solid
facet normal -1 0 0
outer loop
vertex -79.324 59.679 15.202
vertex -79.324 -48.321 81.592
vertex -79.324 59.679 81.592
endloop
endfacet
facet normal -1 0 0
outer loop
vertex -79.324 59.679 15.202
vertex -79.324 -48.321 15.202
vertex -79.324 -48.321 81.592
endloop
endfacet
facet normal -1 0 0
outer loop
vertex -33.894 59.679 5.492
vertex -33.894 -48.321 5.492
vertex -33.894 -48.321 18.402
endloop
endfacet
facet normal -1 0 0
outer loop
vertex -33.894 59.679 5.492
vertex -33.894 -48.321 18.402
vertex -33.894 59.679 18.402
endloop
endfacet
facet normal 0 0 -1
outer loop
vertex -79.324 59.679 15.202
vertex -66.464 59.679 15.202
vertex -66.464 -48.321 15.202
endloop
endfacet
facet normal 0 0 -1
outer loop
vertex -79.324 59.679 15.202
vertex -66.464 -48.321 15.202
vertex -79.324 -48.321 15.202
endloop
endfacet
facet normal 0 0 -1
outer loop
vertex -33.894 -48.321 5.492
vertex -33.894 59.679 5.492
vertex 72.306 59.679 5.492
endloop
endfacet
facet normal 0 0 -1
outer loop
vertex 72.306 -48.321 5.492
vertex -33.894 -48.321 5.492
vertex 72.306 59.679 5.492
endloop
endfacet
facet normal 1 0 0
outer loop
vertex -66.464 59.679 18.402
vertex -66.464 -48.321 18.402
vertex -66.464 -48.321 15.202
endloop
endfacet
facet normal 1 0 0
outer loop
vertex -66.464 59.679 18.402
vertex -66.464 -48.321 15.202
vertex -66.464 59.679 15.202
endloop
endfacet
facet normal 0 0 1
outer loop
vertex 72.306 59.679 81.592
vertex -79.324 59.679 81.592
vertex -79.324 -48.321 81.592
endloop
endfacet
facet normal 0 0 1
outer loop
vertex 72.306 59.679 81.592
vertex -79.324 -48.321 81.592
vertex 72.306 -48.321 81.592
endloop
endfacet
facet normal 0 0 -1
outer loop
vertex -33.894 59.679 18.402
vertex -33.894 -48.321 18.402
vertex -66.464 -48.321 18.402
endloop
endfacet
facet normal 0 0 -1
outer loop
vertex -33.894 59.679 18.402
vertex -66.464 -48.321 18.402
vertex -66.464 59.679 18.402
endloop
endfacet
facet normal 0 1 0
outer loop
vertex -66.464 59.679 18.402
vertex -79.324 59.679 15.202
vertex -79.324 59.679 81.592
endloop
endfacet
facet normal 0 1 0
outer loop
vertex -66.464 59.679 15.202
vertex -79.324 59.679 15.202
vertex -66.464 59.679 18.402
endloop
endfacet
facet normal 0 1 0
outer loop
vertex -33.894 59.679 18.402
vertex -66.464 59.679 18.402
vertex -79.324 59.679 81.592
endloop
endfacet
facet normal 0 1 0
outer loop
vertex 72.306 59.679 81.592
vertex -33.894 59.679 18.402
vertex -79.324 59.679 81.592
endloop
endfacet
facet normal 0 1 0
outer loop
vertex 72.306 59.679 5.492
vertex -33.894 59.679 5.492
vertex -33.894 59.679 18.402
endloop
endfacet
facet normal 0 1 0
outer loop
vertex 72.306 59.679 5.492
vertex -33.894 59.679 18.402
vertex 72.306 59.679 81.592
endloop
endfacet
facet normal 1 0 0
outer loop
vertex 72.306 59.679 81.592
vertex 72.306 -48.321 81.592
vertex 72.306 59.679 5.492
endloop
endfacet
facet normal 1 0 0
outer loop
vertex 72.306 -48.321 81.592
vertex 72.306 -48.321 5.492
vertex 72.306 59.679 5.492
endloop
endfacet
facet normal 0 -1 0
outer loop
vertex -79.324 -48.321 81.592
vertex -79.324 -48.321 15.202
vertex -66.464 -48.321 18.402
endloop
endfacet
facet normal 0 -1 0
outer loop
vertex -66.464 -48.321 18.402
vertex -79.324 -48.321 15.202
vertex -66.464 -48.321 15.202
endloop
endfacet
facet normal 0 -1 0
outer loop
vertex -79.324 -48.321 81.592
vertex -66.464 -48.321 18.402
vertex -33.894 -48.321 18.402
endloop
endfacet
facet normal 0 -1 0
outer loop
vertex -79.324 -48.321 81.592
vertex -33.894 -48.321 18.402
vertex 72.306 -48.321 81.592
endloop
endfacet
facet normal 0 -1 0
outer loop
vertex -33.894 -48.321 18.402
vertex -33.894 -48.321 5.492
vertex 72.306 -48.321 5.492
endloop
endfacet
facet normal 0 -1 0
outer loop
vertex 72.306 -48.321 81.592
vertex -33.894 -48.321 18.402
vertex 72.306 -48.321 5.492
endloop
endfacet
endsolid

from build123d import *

# Parameters (mm, degrees)
SKETCH2_W           = 106.2
SKETCH2_H           = 108
BOSS_EXTRUDE1_DEPTH = 38.1
SKETCH3_W           = 25.19
SKETCH3_H           = 108
BOSS_EXTRUDE2_DEPTH = 45.43
SKETCH5_W           = 12.86
SKETCH5_H           = 108
BOSS_EXTRUDE4_DEPTH = 3.2
SKETCH6_W           = 151.63
SKETCH6_H           = 108
CUT_EXTRUDE1_DEPTH  = 21
SKETCH7_W           = 151.63
SKETCH7_H           = 108
BOSS_EXTRUDE5_DEPTH = 59


with BuildPart() as part:
    # Sketch2 → Boss-Extrude1 (new body)
    with BuildSketch(Plane.XY.offset(5.492308275)):
        with Locations((19.206268294, 5.678957245)):
            Rectangle(SKETCH2_W, SKETCH2_H)
    extrude(amount=BOSS_EXTRUDE1_DEPTH)

    # Sketch3 → Boss-Extrude2 (add)
    with BuildSketch(Plane.ZY.offset(33.893731706)):
        with Locations((30.997308275, 5.678957245)):
            Rectangle(SKETCH3_W, SKETCH3_H)
    extrude(amount=BOSS_EXTRUDE2_DEPTH)

    # Sketch5 → Boss-Extrude4 (add)
    with BuildSketch(Plane(origin=(0, 0, 18.402308275), x_dir=(-1, 0, 0), z_dir=(0, 0, -1))):
        with Locations((72.893731706, 5.678957245)):
            Rectangle(SKETCH5_W, SKETCH5_H)
    extrude(amount=BOSS_EXTRUDE4_DEPTH)

    # Sketch6 → Cut-Extrude1 (cut)
    with BuildSketch(Plane.XY.offset(43.592308275)):
        with Locations((-3.508731706, 5.678957245)):
            Rectangle(SKETCH6_W, SKETCH6_H)
    extrude(amount=-CUT_EXTRUDE1_DEPTH, mode=Mode.SUBTRACT)

    # Sketch7 → Boss-Extrude5 (add)
    with BuildSketch(Plane.XY.offset(22.592308275)):
        with Locations((-3.508731706, 5.678957245)):
            Rectangle(SKETCH7_W, SKETCH7_H)
    extrude(amount=BOSS_EXTRUDE5_DEPTH)


solid = part.part
